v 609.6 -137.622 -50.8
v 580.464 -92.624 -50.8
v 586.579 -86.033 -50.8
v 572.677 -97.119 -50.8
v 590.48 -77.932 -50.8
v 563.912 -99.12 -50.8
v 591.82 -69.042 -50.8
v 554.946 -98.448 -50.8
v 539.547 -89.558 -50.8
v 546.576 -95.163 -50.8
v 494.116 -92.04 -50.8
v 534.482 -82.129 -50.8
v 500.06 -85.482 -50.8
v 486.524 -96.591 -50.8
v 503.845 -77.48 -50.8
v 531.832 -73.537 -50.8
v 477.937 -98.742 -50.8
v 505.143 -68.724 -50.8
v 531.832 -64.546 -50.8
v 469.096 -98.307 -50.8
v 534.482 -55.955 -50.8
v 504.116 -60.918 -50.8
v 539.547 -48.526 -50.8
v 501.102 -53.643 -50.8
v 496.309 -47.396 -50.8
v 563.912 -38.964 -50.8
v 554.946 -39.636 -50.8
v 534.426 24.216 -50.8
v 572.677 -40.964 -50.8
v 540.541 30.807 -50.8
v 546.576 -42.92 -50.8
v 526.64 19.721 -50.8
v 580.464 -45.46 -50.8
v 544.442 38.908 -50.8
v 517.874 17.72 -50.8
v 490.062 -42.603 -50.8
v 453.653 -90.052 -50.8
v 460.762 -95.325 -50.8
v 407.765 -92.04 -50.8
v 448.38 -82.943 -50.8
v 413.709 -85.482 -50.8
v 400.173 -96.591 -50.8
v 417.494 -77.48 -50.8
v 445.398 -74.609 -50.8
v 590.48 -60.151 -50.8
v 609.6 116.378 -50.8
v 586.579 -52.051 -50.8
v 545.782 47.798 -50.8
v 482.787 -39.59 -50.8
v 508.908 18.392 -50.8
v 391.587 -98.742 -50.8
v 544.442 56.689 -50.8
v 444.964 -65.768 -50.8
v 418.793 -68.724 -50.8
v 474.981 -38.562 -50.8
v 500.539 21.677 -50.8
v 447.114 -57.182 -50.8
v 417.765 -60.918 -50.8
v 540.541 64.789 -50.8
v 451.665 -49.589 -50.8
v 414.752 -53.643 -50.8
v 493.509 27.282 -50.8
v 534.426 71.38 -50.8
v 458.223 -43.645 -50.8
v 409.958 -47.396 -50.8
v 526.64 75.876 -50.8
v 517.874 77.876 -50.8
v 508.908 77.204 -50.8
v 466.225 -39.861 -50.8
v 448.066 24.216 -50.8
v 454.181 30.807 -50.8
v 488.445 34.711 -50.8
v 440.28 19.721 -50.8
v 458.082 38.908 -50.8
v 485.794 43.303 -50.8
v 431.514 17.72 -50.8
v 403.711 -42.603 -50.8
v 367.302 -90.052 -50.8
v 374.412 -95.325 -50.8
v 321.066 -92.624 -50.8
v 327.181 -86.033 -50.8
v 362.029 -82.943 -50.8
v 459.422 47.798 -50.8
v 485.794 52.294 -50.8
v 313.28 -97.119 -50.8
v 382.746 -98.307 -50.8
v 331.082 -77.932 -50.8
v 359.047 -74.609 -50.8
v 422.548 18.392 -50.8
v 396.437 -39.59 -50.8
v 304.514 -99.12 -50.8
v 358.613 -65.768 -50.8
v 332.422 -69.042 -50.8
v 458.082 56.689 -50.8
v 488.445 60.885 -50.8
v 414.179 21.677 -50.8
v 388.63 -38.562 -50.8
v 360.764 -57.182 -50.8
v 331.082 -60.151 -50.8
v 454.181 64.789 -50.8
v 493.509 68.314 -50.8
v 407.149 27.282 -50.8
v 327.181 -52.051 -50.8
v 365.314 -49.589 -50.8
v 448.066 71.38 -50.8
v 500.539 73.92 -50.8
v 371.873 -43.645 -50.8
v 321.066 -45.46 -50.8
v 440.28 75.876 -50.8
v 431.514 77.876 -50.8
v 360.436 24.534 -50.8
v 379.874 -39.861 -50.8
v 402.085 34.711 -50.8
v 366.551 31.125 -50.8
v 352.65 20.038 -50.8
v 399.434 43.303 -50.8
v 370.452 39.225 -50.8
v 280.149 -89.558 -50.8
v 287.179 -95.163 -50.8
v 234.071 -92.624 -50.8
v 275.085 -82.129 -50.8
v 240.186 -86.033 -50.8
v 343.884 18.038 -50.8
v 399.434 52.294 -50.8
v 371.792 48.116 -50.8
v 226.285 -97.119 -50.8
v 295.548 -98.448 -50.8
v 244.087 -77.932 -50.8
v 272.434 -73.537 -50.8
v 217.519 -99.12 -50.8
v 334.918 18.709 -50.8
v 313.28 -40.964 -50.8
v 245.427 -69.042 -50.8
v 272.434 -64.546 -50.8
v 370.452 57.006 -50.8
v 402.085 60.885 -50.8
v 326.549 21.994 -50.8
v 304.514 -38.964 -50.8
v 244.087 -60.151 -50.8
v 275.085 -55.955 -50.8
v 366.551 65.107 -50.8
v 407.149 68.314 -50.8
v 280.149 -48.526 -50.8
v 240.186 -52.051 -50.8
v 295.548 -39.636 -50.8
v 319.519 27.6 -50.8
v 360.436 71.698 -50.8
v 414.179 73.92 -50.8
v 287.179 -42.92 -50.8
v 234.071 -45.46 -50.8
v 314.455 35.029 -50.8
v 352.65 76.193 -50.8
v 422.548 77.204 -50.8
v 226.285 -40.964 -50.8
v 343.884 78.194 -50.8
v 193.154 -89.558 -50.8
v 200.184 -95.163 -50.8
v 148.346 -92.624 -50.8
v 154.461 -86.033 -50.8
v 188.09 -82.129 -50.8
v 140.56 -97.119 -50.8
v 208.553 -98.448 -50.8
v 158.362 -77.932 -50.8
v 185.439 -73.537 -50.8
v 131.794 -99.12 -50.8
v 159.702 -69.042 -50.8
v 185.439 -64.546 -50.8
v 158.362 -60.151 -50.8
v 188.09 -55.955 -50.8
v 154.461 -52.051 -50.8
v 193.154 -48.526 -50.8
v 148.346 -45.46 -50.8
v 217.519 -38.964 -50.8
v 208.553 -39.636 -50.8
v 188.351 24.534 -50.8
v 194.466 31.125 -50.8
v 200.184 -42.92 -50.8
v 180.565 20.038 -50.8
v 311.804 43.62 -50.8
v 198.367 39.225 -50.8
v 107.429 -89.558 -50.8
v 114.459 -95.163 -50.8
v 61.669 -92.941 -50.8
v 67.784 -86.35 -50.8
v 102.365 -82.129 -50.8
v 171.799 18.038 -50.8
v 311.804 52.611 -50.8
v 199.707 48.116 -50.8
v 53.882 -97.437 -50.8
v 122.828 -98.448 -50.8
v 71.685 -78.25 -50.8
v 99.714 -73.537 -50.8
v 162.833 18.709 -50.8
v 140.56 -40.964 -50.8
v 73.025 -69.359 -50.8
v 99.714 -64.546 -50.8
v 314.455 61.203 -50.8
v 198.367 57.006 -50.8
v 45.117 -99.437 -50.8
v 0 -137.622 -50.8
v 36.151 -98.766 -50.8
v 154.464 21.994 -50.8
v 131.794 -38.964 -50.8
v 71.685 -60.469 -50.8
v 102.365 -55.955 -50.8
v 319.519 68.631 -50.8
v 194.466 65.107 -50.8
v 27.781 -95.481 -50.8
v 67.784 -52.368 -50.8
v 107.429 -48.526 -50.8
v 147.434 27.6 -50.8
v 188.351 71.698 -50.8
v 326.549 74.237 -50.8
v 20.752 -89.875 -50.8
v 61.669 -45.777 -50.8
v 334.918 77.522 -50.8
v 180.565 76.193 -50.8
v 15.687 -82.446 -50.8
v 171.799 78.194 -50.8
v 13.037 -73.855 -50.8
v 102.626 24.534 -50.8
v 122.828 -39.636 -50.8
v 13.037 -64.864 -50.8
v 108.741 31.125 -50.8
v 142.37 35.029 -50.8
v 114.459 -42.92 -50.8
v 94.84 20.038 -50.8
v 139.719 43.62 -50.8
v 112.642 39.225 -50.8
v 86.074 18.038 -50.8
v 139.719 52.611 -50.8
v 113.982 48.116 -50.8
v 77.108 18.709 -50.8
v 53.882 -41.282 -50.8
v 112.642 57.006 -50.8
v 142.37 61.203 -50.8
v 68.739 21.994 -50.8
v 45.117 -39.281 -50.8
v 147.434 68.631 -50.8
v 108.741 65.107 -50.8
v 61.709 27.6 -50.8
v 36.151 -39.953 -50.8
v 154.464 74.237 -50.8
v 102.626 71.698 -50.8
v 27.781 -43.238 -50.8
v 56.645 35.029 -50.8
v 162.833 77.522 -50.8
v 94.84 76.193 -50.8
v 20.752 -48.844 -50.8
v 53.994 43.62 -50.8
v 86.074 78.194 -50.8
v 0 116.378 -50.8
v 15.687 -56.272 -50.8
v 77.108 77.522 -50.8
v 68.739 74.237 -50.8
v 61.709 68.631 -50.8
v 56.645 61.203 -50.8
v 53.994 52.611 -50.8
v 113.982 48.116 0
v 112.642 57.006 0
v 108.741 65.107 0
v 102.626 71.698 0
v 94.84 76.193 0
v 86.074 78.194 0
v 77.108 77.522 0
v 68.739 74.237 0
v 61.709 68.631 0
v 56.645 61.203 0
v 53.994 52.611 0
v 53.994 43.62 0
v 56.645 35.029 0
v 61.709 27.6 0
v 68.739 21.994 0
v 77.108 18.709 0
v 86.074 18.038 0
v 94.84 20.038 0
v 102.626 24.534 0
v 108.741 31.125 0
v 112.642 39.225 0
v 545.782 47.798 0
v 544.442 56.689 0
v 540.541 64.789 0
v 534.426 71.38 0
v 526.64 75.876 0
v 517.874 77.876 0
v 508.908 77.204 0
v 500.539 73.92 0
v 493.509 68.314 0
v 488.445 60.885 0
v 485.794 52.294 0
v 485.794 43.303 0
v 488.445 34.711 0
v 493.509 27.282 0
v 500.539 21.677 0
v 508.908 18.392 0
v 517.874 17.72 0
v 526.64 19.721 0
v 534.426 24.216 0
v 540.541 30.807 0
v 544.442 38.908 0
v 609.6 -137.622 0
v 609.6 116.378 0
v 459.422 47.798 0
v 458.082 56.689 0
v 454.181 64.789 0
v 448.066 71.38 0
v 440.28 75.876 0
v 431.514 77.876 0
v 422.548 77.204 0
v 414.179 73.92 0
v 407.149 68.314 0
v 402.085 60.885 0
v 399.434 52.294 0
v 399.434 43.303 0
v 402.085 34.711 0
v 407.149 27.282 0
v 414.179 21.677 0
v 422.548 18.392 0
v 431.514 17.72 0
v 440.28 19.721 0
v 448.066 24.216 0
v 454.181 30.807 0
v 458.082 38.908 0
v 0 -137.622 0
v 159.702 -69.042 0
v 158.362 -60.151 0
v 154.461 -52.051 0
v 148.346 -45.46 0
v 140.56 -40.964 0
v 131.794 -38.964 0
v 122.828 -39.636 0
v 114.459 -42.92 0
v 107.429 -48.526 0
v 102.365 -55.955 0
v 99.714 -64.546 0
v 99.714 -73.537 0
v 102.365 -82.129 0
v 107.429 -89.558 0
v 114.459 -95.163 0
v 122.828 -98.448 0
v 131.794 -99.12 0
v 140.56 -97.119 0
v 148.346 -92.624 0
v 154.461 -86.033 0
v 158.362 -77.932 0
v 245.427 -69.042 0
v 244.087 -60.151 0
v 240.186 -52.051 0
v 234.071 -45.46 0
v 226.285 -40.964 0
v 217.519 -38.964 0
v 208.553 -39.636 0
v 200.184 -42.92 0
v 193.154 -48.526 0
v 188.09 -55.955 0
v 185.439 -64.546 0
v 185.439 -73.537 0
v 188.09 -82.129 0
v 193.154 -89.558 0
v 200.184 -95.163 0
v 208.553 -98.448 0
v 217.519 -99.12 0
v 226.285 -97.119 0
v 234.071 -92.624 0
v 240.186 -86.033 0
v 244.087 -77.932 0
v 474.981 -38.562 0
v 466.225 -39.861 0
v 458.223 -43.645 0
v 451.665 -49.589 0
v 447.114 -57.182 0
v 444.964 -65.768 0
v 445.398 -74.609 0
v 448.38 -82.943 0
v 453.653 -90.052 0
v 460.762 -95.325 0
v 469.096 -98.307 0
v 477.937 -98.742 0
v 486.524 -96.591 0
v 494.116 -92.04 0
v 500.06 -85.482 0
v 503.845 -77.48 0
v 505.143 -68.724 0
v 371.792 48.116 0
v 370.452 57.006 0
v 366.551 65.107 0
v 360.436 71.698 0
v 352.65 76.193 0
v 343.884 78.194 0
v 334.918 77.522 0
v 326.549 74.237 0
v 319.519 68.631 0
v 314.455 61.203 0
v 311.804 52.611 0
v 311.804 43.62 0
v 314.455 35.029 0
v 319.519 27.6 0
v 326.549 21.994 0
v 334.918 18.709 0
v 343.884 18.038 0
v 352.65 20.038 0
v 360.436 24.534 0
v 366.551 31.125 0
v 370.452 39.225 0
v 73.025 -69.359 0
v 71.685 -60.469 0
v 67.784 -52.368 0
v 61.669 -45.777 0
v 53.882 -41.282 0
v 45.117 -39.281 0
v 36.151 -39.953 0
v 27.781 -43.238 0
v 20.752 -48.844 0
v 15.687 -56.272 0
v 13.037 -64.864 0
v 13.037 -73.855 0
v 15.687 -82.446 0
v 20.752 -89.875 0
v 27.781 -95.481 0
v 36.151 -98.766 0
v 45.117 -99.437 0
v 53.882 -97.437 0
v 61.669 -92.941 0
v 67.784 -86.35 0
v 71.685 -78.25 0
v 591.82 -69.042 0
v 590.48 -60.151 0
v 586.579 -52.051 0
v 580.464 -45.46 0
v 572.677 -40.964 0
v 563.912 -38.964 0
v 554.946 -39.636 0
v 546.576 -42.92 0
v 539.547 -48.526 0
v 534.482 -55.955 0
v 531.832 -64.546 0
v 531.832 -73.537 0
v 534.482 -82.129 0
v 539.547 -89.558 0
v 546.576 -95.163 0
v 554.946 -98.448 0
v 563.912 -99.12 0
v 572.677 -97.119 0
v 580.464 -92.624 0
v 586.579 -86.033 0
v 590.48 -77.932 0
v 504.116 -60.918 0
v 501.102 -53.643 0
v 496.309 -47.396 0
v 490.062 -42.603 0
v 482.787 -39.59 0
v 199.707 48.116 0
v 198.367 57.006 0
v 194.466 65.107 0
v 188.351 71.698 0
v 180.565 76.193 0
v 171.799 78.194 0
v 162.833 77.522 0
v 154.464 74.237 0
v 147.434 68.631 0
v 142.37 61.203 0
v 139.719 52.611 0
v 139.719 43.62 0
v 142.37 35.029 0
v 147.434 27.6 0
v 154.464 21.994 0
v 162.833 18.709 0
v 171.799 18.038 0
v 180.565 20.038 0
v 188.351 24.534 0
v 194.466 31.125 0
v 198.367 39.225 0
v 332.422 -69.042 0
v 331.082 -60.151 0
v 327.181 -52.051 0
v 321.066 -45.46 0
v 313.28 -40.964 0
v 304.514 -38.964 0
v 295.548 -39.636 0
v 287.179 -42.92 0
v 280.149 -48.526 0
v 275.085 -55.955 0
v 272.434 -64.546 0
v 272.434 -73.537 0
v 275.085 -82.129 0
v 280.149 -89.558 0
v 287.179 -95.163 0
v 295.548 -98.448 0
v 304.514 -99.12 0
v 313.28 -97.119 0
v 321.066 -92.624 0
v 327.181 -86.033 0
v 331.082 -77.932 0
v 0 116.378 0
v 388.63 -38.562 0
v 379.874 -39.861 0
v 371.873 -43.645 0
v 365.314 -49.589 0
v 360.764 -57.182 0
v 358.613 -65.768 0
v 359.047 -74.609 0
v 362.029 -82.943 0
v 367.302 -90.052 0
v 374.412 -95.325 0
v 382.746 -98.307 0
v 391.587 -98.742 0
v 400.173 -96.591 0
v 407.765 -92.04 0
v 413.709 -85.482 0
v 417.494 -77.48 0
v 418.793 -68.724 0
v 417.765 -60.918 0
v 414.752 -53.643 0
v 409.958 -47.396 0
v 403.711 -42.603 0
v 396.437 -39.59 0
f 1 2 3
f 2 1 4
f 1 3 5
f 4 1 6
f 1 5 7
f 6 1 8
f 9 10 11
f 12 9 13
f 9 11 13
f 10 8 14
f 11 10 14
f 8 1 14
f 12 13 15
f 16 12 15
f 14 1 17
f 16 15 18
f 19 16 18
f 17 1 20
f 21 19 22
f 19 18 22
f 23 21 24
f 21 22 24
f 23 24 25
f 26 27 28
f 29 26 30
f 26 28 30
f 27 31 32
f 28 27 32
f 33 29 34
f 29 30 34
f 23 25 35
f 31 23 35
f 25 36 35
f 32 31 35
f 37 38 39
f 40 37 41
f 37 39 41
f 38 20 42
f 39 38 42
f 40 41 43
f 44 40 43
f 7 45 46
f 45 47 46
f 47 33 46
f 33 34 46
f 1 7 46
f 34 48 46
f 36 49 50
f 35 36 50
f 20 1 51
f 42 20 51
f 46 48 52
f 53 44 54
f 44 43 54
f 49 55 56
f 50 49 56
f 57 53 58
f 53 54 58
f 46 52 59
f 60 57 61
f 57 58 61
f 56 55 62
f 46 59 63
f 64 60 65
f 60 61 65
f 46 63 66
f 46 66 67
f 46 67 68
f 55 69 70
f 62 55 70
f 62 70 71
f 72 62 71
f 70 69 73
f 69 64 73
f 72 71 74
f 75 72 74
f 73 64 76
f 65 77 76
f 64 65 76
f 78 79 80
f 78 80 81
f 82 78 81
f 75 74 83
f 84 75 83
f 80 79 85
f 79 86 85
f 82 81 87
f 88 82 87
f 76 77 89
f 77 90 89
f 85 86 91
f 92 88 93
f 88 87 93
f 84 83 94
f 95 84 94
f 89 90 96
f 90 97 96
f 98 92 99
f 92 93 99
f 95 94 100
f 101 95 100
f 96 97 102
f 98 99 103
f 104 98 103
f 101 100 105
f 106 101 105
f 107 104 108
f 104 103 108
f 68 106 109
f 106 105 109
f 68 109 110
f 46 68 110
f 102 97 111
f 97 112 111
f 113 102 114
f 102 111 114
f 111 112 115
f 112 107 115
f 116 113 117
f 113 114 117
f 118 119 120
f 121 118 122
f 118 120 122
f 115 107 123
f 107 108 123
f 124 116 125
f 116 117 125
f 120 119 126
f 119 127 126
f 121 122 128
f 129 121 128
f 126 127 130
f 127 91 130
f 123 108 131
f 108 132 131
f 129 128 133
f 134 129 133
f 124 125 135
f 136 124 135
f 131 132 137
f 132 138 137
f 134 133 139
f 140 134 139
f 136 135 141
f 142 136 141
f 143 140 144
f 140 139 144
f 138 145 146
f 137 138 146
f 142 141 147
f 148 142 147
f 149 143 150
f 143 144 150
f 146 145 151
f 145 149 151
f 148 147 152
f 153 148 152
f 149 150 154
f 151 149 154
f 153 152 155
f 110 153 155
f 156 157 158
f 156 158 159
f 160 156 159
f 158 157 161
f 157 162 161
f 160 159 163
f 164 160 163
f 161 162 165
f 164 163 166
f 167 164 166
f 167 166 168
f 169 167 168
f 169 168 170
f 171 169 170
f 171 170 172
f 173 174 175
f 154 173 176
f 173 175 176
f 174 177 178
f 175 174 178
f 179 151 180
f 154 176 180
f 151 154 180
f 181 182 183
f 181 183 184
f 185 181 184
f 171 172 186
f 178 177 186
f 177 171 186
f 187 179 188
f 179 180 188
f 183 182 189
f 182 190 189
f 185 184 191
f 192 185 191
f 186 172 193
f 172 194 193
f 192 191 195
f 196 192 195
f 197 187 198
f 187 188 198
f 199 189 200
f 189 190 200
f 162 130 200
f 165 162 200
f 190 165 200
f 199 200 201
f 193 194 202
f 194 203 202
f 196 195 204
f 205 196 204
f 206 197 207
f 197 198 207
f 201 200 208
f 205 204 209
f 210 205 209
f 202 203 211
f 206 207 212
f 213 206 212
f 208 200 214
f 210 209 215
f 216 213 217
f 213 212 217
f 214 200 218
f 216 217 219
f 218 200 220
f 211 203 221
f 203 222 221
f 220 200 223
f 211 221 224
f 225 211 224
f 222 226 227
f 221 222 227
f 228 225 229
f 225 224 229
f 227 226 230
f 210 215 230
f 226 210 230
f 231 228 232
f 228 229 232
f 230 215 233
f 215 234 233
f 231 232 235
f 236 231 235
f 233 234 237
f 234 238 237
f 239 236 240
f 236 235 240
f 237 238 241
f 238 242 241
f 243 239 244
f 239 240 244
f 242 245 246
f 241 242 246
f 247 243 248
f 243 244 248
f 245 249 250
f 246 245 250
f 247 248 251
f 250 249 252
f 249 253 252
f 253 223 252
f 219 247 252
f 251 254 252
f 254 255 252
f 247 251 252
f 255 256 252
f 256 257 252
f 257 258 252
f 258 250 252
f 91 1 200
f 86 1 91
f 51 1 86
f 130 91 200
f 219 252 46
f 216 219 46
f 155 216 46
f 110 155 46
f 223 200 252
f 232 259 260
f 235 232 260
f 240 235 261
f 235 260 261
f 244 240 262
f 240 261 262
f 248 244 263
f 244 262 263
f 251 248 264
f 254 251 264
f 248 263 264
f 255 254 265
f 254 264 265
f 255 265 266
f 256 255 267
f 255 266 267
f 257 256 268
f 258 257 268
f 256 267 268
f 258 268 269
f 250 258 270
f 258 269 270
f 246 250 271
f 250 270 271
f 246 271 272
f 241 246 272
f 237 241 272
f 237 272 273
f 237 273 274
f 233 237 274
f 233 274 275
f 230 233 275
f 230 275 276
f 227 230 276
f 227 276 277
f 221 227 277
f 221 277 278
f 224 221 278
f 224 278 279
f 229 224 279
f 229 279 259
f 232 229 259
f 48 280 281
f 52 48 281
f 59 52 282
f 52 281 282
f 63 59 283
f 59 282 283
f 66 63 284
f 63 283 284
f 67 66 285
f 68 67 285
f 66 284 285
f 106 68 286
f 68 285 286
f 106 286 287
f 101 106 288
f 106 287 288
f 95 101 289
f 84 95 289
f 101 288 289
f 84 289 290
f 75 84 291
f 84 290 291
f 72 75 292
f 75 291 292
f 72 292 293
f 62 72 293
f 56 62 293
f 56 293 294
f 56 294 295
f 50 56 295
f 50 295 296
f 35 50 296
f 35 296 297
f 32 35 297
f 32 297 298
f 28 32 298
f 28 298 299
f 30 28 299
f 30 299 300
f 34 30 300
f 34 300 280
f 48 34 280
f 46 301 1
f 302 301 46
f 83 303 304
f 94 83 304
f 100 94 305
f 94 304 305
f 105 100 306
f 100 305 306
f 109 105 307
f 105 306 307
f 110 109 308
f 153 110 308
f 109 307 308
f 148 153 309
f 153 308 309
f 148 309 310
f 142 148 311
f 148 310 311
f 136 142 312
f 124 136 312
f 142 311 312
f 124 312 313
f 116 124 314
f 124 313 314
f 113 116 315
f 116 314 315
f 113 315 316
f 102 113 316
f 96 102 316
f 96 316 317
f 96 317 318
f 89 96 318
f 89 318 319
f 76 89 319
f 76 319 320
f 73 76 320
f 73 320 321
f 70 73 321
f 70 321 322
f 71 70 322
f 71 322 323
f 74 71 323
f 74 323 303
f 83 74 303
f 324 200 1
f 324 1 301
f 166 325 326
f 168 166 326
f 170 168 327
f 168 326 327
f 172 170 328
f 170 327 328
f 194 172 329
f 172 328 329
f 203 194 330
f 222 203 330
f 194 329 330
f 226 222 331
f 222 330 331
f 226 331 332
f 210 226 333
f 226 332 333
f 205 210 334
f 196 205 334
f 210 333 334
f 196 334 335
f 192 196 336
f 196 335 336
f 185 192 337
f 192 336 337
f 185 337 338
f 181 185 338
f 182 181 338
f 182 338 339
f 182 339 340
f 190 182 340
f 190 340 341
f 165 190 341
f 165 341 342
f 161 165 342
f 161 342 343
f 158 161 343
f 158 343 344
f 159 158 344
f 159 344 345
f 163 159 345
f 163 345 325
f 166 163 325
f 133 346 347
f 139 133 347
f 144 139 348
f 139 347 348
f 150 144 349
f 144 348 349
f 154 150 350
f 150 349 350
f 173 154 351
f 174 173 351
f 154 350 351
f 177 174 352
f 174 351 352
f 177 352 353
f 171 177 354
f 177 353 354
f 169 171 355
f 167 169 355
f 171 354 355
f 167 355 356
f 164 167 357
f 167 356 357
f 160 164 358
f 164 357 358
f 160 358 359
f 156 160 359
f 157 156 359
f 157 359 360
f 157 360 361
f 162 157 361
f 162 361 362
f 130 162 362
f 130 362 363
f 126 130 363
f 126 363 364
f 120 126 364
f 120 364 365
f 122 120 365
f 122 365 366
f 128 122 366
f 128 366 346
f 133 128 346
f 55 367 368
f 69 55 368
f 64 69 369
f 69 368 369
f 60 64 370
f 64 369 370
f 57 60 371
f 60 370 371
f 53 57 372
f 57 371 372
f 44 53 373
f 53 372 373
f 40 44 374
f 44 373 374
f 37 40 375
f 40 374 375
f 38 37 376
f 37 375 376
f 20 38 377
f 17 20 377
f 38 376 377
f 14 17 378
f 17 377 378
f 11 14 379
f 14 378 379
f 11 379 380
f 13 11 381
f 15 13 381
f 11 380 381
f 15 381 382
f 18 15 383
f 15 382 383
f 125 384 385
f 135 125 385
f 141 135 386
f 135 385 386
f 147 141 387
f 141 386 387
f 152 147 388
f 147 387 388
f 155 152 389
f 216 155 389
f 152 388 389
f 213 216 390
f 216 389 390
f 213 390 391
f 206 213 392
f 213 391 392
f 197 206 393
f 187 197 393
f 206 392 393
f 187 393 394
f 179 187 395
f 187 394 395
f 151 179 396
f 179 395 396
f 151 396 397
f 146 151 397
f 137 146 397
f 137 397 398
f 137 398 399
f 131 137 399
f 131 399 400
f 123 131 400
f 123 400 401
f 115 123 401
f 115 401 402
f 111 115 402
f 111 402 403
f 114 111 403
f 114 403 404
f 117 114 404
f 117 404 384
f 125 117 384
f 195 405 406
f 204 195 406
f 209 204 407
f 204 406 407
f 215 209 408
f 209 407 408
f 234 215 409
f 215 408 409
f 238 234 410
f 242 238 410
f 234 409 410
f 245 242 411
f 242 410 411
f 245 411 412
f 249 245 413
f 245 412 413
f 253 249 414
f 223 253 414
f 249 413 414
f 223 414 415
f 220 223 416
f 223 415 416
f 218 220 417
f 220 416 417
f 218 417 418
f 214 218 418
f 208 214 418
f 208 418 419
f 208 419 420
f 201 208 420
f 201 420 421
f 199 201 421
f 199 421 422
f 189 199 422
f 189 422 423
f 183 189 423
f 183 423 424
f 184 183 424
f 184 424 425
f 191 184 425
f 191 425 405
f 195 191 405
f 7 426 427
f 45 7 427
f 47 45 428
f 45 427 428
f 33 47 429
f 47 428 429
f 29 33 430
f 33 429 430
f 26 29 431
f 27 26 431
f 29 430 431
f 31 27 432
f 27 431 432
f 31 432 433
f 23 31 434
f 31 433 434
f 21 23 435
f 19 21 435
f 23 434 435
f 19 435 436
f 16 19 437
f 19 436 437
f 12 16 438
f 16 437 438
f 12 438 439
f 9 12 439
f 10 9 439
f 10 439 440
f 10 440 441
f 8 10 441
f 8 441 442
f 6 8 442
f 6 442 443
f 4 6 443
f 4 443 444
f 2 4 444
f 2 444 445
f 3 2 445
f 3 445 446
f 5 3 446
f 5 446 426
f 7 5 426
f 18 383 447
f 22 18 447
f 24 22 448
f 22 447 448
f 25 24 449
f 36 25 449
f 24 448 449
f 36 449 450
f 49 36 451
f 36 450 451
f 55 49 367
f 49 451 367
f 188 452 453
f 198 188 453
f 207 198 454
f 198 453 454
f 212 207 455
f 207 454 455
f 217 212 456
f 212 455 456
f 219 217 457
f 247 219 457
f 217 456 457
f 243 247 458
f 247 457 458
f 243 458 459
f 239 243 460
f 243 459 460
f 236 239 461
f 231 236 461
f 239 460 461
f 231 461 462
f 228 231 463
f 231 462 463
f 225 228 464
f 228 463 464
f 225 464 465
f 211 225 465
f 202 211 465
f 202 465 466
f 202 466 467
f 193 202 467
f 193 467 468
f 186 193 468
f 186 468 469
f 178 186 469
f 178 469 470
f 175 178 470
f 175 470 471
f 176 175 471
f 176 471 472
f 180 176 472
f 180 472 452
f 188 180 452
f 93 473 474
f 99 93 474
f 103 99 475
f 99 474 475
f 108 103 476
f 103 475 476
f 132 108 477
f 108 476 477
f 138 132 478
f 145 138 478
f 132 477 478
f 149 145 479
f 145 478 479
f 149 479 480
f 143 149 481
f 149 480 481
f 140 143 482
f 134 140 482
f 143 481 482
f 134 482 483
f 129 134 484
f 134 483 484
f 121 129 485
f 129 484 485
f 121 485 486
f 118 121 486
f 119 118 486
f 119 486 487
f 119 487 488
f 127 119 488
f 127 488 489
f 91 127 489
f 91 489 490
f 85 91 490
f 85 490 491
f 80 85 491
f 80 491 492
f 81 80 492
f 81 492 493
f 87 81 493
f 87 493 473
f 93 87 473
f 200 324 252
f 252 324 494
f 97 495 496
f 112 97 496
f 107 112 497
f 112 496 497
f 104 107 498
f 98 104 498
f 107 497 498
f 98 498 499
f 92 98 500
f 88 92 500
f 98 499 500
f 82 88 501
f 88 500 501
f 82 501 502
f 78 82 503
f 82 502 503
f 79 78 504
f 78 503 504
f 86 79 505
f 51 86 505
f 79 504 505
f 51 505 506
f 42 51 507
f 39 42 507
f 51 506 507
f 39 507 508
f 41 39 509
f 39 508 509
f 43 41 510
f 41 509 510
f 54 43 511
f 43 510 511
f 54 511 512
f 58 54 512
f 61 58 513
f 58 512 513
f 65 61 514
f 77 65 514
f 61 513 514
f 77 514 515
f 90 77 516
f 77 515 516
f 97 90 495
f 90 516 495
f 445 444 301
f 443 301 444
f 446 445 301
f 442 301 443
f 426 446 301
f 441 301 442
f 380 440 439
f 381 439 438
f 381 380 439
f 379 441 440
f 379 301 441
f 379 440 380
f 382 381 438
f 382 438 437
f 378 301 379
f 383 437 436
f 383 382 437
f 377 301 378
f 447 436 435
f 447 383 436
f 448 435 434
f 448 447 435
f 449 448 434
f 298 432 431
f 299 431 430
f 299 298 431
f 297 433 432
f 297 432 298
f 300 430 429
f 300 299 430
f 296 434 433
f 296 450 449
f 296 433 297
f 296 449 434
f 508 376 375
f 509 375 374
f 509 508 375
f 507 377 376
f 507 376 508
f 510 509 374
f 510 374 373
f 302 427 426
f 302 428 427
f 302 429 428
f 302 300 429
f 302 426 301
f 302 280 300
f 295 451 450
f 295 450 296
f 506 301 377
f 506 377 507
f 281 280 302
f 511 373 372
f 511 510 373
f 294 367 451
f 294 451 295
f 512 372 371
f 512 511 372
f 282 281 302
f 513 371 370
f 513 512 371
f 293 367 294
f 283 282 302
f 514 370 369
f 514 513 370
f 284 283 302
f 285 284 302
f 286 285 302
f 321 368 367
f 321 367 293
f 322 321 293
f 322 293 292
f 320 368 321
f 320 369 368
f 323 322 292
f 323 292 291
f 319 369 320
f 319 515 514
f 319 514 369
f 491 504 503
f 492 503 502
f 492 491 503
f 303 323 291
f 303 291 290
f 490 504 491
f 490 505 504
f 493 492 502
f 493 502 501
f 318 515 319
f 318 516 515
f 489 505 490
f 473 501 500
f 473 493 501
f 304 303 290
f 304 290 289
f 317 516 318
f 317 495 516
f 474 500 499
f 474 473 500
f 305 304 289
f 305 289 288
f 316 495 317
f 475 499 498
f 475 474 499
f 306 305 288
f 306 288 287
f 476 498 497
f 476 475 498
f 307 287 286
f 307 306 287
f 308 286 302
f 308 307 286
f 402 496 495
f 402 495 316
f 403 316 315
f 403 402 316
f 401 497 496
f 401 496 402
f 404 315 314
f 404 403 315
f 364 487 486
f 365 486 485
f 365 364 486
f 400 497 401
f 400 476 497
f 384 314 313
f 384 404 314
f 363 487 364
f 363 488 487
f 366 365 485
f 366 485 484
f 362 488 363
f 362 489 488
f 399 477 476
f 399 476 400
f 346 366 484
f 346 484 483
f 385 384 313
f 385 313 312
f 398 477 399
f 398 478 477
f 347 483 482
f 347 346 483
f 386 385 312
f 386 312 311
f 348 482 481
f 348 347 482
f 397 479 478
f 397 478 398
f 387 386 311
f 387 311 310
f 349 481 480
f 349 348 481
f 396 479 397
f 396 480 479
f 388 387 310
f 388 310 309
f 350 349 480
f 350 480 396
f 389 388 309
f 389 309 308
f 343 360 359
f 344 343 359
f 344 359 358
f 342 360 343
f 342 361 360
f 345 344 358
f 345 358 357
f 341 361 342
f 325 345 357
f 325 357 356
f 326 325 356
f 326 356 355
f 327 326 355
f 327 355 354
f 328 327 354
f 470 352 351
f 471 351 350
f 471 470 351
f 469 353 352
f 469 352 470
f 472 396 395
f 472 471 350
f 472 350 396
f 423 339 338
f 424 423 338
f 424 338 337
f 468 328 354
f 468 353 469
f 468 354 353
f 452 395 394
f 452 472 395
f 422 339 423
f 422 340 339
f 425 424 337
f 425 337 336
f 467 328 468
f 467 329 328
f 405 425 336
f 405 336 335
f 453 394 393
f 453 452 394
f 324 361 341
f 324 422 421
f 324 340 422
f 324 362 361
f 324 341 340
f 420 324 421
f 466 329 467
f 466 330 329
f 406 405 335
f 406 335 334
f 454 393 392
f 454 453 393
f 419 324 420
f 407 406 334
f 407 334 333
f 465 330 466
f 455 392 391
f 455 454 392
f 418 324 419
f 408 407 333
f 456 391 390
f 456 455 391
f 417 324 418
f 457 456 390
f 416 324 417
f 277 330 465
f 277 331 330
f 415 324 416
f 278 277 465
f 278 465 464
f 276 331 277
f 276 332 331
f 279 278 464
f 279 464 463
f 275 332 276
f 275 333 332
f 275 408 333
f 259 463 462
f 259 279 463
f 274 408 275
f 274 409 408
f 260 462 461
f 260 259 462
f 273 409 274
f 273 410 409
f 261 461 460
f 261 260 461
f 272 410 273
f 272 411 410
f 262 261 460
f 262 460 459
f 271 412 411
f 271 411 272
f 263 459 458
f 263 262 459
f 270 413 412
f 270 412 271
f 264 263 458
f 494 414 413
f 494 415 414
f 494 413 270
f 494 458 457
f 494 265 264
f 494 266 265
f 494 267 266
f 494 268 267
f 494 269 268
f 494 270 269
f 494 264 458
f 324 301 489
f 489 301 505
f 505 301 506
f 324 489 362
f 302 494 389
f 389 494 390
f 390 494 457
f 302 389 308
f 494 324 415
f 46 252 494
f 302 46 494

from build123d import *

# Parameters (mm, degrees)
F0_W     = 254
F0_H     = 50.8
F1_DEPTH = 609.6
F2_R     = 30.1625
F3_DEPTH = 107.192695


with BuildPart() as f1:
    # F0 (on Right) → F1 (new body)
    with BuildSketch(Plane.YZ):
        with Locations((-10.621817, -25.4)):
            Rectangle(F0_W, F0_H)
    extrude(amount=F1_DEPTH)

    # F2 (on Top) → F3 (cut)
    with BuildSketch(Plane.XY):
        with Locations((42.8625, -69.359317)):
            Circle(F2_R)
        with Locations((83.82, 48.115683)):
            Circle(F2_R)
        with Locations((129.54, -69.041817)):
            Circle(F2_R)
        with Locations((169.545, 48.115683)):
            Circle(F2_R)
        with Locations((215.265, -69.041817)):
            Circle(F2_R)
        with Locations((302.26, -69.041817)):
            Circle(F2_R)
        with BuildLine():
            ThreePointArc((388.63007, -38.561817), (367.301962, -90.052425), (418.79257, -68.724317))
            ThreePointArc((418.79257, -68.724317), (409.958178, -47.396209), (388.63007, -38.561817))
        make_face()
        with BuildLine():
            ThreePointArc((505.143344, -68.724317), (496.308952, -47.396209), (474.980844, -38.561817))
            ThreePointArc((474.980844, -38.561817), (453.652735, -90.052425), (505.143344, -68.724317))
        make_face()
        with Locations((341.63, 48.115683)):
            Circle(F2_R)
        with Locations((429.26, 47.798183)):
            Circle(F2_R)
        with Locations((515.62, 47.798183)):
            Circle(F2_R)
        with Locations((561.6575, -69.041817)):
            Circle(F2_R)
    extrude(amount=-F3_DEPTH, mode=Mode.SUBTRACT)


solid = f1.part
